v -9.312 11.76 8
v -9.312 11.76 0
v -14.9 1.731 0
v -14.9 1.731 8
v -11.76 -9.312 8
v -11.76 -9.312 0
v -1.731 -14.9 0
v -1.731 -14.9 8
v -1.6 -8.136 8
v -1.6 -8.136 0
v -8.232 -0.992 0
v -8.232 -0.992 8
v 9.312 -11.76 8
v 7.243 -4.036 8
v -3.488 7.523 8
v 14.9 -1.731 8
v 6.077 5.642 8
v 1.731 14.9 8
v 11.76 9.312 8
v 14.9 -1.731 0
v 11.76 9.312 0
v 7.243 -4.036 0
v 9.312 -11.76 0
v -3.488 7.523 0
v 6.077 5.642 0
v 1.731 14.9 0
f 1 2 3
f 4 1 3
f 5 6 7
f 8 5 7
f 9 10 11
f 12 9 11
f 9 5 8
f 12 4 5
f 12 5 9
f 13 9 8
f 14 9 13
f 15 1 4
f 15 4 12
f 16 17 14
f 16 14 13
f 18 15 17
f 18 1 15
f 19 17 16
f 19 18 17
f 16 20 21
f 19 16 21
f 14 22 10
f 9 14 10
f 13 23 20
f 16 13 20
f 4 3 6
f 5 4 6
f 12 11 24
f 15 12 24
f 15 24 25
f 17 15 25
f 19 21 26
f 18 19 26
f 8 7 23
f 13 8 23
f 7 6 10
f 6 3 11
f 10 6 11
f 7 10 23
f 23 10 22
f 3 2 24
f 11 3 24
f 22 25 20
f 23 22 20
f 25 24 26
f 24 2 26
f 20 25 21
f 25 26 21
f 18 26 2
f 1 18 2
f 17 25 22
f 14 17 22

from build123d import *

# Parameters (mm, degrees)
F1_DEPTH = 8


with BuildPart() as f1:
    # F0 (on Top) → F1 (new body)
    with BuildSketch(Plane.XY):
        Polygon((-9.311619, 11.759837), (-14.899769, 1.731152), (-11.759837, -9.311619), (-1.731152, -14.899769), (9.311619, -11.759837), (14.899769, -1.731152), (11.759837, 9.311619), (1.731152, 14.899769), align=None)
        Polygon((-1.600227, -8.135918), (-8.232215, -0.992231), (-3.487562, 7.522685), (6.076783, 5.641506), (7.24322, -4.036043), align=None, mode=Mode.SUBTRACT)
    extrude(amount=F1_DEPTH)


solid = f1.part
